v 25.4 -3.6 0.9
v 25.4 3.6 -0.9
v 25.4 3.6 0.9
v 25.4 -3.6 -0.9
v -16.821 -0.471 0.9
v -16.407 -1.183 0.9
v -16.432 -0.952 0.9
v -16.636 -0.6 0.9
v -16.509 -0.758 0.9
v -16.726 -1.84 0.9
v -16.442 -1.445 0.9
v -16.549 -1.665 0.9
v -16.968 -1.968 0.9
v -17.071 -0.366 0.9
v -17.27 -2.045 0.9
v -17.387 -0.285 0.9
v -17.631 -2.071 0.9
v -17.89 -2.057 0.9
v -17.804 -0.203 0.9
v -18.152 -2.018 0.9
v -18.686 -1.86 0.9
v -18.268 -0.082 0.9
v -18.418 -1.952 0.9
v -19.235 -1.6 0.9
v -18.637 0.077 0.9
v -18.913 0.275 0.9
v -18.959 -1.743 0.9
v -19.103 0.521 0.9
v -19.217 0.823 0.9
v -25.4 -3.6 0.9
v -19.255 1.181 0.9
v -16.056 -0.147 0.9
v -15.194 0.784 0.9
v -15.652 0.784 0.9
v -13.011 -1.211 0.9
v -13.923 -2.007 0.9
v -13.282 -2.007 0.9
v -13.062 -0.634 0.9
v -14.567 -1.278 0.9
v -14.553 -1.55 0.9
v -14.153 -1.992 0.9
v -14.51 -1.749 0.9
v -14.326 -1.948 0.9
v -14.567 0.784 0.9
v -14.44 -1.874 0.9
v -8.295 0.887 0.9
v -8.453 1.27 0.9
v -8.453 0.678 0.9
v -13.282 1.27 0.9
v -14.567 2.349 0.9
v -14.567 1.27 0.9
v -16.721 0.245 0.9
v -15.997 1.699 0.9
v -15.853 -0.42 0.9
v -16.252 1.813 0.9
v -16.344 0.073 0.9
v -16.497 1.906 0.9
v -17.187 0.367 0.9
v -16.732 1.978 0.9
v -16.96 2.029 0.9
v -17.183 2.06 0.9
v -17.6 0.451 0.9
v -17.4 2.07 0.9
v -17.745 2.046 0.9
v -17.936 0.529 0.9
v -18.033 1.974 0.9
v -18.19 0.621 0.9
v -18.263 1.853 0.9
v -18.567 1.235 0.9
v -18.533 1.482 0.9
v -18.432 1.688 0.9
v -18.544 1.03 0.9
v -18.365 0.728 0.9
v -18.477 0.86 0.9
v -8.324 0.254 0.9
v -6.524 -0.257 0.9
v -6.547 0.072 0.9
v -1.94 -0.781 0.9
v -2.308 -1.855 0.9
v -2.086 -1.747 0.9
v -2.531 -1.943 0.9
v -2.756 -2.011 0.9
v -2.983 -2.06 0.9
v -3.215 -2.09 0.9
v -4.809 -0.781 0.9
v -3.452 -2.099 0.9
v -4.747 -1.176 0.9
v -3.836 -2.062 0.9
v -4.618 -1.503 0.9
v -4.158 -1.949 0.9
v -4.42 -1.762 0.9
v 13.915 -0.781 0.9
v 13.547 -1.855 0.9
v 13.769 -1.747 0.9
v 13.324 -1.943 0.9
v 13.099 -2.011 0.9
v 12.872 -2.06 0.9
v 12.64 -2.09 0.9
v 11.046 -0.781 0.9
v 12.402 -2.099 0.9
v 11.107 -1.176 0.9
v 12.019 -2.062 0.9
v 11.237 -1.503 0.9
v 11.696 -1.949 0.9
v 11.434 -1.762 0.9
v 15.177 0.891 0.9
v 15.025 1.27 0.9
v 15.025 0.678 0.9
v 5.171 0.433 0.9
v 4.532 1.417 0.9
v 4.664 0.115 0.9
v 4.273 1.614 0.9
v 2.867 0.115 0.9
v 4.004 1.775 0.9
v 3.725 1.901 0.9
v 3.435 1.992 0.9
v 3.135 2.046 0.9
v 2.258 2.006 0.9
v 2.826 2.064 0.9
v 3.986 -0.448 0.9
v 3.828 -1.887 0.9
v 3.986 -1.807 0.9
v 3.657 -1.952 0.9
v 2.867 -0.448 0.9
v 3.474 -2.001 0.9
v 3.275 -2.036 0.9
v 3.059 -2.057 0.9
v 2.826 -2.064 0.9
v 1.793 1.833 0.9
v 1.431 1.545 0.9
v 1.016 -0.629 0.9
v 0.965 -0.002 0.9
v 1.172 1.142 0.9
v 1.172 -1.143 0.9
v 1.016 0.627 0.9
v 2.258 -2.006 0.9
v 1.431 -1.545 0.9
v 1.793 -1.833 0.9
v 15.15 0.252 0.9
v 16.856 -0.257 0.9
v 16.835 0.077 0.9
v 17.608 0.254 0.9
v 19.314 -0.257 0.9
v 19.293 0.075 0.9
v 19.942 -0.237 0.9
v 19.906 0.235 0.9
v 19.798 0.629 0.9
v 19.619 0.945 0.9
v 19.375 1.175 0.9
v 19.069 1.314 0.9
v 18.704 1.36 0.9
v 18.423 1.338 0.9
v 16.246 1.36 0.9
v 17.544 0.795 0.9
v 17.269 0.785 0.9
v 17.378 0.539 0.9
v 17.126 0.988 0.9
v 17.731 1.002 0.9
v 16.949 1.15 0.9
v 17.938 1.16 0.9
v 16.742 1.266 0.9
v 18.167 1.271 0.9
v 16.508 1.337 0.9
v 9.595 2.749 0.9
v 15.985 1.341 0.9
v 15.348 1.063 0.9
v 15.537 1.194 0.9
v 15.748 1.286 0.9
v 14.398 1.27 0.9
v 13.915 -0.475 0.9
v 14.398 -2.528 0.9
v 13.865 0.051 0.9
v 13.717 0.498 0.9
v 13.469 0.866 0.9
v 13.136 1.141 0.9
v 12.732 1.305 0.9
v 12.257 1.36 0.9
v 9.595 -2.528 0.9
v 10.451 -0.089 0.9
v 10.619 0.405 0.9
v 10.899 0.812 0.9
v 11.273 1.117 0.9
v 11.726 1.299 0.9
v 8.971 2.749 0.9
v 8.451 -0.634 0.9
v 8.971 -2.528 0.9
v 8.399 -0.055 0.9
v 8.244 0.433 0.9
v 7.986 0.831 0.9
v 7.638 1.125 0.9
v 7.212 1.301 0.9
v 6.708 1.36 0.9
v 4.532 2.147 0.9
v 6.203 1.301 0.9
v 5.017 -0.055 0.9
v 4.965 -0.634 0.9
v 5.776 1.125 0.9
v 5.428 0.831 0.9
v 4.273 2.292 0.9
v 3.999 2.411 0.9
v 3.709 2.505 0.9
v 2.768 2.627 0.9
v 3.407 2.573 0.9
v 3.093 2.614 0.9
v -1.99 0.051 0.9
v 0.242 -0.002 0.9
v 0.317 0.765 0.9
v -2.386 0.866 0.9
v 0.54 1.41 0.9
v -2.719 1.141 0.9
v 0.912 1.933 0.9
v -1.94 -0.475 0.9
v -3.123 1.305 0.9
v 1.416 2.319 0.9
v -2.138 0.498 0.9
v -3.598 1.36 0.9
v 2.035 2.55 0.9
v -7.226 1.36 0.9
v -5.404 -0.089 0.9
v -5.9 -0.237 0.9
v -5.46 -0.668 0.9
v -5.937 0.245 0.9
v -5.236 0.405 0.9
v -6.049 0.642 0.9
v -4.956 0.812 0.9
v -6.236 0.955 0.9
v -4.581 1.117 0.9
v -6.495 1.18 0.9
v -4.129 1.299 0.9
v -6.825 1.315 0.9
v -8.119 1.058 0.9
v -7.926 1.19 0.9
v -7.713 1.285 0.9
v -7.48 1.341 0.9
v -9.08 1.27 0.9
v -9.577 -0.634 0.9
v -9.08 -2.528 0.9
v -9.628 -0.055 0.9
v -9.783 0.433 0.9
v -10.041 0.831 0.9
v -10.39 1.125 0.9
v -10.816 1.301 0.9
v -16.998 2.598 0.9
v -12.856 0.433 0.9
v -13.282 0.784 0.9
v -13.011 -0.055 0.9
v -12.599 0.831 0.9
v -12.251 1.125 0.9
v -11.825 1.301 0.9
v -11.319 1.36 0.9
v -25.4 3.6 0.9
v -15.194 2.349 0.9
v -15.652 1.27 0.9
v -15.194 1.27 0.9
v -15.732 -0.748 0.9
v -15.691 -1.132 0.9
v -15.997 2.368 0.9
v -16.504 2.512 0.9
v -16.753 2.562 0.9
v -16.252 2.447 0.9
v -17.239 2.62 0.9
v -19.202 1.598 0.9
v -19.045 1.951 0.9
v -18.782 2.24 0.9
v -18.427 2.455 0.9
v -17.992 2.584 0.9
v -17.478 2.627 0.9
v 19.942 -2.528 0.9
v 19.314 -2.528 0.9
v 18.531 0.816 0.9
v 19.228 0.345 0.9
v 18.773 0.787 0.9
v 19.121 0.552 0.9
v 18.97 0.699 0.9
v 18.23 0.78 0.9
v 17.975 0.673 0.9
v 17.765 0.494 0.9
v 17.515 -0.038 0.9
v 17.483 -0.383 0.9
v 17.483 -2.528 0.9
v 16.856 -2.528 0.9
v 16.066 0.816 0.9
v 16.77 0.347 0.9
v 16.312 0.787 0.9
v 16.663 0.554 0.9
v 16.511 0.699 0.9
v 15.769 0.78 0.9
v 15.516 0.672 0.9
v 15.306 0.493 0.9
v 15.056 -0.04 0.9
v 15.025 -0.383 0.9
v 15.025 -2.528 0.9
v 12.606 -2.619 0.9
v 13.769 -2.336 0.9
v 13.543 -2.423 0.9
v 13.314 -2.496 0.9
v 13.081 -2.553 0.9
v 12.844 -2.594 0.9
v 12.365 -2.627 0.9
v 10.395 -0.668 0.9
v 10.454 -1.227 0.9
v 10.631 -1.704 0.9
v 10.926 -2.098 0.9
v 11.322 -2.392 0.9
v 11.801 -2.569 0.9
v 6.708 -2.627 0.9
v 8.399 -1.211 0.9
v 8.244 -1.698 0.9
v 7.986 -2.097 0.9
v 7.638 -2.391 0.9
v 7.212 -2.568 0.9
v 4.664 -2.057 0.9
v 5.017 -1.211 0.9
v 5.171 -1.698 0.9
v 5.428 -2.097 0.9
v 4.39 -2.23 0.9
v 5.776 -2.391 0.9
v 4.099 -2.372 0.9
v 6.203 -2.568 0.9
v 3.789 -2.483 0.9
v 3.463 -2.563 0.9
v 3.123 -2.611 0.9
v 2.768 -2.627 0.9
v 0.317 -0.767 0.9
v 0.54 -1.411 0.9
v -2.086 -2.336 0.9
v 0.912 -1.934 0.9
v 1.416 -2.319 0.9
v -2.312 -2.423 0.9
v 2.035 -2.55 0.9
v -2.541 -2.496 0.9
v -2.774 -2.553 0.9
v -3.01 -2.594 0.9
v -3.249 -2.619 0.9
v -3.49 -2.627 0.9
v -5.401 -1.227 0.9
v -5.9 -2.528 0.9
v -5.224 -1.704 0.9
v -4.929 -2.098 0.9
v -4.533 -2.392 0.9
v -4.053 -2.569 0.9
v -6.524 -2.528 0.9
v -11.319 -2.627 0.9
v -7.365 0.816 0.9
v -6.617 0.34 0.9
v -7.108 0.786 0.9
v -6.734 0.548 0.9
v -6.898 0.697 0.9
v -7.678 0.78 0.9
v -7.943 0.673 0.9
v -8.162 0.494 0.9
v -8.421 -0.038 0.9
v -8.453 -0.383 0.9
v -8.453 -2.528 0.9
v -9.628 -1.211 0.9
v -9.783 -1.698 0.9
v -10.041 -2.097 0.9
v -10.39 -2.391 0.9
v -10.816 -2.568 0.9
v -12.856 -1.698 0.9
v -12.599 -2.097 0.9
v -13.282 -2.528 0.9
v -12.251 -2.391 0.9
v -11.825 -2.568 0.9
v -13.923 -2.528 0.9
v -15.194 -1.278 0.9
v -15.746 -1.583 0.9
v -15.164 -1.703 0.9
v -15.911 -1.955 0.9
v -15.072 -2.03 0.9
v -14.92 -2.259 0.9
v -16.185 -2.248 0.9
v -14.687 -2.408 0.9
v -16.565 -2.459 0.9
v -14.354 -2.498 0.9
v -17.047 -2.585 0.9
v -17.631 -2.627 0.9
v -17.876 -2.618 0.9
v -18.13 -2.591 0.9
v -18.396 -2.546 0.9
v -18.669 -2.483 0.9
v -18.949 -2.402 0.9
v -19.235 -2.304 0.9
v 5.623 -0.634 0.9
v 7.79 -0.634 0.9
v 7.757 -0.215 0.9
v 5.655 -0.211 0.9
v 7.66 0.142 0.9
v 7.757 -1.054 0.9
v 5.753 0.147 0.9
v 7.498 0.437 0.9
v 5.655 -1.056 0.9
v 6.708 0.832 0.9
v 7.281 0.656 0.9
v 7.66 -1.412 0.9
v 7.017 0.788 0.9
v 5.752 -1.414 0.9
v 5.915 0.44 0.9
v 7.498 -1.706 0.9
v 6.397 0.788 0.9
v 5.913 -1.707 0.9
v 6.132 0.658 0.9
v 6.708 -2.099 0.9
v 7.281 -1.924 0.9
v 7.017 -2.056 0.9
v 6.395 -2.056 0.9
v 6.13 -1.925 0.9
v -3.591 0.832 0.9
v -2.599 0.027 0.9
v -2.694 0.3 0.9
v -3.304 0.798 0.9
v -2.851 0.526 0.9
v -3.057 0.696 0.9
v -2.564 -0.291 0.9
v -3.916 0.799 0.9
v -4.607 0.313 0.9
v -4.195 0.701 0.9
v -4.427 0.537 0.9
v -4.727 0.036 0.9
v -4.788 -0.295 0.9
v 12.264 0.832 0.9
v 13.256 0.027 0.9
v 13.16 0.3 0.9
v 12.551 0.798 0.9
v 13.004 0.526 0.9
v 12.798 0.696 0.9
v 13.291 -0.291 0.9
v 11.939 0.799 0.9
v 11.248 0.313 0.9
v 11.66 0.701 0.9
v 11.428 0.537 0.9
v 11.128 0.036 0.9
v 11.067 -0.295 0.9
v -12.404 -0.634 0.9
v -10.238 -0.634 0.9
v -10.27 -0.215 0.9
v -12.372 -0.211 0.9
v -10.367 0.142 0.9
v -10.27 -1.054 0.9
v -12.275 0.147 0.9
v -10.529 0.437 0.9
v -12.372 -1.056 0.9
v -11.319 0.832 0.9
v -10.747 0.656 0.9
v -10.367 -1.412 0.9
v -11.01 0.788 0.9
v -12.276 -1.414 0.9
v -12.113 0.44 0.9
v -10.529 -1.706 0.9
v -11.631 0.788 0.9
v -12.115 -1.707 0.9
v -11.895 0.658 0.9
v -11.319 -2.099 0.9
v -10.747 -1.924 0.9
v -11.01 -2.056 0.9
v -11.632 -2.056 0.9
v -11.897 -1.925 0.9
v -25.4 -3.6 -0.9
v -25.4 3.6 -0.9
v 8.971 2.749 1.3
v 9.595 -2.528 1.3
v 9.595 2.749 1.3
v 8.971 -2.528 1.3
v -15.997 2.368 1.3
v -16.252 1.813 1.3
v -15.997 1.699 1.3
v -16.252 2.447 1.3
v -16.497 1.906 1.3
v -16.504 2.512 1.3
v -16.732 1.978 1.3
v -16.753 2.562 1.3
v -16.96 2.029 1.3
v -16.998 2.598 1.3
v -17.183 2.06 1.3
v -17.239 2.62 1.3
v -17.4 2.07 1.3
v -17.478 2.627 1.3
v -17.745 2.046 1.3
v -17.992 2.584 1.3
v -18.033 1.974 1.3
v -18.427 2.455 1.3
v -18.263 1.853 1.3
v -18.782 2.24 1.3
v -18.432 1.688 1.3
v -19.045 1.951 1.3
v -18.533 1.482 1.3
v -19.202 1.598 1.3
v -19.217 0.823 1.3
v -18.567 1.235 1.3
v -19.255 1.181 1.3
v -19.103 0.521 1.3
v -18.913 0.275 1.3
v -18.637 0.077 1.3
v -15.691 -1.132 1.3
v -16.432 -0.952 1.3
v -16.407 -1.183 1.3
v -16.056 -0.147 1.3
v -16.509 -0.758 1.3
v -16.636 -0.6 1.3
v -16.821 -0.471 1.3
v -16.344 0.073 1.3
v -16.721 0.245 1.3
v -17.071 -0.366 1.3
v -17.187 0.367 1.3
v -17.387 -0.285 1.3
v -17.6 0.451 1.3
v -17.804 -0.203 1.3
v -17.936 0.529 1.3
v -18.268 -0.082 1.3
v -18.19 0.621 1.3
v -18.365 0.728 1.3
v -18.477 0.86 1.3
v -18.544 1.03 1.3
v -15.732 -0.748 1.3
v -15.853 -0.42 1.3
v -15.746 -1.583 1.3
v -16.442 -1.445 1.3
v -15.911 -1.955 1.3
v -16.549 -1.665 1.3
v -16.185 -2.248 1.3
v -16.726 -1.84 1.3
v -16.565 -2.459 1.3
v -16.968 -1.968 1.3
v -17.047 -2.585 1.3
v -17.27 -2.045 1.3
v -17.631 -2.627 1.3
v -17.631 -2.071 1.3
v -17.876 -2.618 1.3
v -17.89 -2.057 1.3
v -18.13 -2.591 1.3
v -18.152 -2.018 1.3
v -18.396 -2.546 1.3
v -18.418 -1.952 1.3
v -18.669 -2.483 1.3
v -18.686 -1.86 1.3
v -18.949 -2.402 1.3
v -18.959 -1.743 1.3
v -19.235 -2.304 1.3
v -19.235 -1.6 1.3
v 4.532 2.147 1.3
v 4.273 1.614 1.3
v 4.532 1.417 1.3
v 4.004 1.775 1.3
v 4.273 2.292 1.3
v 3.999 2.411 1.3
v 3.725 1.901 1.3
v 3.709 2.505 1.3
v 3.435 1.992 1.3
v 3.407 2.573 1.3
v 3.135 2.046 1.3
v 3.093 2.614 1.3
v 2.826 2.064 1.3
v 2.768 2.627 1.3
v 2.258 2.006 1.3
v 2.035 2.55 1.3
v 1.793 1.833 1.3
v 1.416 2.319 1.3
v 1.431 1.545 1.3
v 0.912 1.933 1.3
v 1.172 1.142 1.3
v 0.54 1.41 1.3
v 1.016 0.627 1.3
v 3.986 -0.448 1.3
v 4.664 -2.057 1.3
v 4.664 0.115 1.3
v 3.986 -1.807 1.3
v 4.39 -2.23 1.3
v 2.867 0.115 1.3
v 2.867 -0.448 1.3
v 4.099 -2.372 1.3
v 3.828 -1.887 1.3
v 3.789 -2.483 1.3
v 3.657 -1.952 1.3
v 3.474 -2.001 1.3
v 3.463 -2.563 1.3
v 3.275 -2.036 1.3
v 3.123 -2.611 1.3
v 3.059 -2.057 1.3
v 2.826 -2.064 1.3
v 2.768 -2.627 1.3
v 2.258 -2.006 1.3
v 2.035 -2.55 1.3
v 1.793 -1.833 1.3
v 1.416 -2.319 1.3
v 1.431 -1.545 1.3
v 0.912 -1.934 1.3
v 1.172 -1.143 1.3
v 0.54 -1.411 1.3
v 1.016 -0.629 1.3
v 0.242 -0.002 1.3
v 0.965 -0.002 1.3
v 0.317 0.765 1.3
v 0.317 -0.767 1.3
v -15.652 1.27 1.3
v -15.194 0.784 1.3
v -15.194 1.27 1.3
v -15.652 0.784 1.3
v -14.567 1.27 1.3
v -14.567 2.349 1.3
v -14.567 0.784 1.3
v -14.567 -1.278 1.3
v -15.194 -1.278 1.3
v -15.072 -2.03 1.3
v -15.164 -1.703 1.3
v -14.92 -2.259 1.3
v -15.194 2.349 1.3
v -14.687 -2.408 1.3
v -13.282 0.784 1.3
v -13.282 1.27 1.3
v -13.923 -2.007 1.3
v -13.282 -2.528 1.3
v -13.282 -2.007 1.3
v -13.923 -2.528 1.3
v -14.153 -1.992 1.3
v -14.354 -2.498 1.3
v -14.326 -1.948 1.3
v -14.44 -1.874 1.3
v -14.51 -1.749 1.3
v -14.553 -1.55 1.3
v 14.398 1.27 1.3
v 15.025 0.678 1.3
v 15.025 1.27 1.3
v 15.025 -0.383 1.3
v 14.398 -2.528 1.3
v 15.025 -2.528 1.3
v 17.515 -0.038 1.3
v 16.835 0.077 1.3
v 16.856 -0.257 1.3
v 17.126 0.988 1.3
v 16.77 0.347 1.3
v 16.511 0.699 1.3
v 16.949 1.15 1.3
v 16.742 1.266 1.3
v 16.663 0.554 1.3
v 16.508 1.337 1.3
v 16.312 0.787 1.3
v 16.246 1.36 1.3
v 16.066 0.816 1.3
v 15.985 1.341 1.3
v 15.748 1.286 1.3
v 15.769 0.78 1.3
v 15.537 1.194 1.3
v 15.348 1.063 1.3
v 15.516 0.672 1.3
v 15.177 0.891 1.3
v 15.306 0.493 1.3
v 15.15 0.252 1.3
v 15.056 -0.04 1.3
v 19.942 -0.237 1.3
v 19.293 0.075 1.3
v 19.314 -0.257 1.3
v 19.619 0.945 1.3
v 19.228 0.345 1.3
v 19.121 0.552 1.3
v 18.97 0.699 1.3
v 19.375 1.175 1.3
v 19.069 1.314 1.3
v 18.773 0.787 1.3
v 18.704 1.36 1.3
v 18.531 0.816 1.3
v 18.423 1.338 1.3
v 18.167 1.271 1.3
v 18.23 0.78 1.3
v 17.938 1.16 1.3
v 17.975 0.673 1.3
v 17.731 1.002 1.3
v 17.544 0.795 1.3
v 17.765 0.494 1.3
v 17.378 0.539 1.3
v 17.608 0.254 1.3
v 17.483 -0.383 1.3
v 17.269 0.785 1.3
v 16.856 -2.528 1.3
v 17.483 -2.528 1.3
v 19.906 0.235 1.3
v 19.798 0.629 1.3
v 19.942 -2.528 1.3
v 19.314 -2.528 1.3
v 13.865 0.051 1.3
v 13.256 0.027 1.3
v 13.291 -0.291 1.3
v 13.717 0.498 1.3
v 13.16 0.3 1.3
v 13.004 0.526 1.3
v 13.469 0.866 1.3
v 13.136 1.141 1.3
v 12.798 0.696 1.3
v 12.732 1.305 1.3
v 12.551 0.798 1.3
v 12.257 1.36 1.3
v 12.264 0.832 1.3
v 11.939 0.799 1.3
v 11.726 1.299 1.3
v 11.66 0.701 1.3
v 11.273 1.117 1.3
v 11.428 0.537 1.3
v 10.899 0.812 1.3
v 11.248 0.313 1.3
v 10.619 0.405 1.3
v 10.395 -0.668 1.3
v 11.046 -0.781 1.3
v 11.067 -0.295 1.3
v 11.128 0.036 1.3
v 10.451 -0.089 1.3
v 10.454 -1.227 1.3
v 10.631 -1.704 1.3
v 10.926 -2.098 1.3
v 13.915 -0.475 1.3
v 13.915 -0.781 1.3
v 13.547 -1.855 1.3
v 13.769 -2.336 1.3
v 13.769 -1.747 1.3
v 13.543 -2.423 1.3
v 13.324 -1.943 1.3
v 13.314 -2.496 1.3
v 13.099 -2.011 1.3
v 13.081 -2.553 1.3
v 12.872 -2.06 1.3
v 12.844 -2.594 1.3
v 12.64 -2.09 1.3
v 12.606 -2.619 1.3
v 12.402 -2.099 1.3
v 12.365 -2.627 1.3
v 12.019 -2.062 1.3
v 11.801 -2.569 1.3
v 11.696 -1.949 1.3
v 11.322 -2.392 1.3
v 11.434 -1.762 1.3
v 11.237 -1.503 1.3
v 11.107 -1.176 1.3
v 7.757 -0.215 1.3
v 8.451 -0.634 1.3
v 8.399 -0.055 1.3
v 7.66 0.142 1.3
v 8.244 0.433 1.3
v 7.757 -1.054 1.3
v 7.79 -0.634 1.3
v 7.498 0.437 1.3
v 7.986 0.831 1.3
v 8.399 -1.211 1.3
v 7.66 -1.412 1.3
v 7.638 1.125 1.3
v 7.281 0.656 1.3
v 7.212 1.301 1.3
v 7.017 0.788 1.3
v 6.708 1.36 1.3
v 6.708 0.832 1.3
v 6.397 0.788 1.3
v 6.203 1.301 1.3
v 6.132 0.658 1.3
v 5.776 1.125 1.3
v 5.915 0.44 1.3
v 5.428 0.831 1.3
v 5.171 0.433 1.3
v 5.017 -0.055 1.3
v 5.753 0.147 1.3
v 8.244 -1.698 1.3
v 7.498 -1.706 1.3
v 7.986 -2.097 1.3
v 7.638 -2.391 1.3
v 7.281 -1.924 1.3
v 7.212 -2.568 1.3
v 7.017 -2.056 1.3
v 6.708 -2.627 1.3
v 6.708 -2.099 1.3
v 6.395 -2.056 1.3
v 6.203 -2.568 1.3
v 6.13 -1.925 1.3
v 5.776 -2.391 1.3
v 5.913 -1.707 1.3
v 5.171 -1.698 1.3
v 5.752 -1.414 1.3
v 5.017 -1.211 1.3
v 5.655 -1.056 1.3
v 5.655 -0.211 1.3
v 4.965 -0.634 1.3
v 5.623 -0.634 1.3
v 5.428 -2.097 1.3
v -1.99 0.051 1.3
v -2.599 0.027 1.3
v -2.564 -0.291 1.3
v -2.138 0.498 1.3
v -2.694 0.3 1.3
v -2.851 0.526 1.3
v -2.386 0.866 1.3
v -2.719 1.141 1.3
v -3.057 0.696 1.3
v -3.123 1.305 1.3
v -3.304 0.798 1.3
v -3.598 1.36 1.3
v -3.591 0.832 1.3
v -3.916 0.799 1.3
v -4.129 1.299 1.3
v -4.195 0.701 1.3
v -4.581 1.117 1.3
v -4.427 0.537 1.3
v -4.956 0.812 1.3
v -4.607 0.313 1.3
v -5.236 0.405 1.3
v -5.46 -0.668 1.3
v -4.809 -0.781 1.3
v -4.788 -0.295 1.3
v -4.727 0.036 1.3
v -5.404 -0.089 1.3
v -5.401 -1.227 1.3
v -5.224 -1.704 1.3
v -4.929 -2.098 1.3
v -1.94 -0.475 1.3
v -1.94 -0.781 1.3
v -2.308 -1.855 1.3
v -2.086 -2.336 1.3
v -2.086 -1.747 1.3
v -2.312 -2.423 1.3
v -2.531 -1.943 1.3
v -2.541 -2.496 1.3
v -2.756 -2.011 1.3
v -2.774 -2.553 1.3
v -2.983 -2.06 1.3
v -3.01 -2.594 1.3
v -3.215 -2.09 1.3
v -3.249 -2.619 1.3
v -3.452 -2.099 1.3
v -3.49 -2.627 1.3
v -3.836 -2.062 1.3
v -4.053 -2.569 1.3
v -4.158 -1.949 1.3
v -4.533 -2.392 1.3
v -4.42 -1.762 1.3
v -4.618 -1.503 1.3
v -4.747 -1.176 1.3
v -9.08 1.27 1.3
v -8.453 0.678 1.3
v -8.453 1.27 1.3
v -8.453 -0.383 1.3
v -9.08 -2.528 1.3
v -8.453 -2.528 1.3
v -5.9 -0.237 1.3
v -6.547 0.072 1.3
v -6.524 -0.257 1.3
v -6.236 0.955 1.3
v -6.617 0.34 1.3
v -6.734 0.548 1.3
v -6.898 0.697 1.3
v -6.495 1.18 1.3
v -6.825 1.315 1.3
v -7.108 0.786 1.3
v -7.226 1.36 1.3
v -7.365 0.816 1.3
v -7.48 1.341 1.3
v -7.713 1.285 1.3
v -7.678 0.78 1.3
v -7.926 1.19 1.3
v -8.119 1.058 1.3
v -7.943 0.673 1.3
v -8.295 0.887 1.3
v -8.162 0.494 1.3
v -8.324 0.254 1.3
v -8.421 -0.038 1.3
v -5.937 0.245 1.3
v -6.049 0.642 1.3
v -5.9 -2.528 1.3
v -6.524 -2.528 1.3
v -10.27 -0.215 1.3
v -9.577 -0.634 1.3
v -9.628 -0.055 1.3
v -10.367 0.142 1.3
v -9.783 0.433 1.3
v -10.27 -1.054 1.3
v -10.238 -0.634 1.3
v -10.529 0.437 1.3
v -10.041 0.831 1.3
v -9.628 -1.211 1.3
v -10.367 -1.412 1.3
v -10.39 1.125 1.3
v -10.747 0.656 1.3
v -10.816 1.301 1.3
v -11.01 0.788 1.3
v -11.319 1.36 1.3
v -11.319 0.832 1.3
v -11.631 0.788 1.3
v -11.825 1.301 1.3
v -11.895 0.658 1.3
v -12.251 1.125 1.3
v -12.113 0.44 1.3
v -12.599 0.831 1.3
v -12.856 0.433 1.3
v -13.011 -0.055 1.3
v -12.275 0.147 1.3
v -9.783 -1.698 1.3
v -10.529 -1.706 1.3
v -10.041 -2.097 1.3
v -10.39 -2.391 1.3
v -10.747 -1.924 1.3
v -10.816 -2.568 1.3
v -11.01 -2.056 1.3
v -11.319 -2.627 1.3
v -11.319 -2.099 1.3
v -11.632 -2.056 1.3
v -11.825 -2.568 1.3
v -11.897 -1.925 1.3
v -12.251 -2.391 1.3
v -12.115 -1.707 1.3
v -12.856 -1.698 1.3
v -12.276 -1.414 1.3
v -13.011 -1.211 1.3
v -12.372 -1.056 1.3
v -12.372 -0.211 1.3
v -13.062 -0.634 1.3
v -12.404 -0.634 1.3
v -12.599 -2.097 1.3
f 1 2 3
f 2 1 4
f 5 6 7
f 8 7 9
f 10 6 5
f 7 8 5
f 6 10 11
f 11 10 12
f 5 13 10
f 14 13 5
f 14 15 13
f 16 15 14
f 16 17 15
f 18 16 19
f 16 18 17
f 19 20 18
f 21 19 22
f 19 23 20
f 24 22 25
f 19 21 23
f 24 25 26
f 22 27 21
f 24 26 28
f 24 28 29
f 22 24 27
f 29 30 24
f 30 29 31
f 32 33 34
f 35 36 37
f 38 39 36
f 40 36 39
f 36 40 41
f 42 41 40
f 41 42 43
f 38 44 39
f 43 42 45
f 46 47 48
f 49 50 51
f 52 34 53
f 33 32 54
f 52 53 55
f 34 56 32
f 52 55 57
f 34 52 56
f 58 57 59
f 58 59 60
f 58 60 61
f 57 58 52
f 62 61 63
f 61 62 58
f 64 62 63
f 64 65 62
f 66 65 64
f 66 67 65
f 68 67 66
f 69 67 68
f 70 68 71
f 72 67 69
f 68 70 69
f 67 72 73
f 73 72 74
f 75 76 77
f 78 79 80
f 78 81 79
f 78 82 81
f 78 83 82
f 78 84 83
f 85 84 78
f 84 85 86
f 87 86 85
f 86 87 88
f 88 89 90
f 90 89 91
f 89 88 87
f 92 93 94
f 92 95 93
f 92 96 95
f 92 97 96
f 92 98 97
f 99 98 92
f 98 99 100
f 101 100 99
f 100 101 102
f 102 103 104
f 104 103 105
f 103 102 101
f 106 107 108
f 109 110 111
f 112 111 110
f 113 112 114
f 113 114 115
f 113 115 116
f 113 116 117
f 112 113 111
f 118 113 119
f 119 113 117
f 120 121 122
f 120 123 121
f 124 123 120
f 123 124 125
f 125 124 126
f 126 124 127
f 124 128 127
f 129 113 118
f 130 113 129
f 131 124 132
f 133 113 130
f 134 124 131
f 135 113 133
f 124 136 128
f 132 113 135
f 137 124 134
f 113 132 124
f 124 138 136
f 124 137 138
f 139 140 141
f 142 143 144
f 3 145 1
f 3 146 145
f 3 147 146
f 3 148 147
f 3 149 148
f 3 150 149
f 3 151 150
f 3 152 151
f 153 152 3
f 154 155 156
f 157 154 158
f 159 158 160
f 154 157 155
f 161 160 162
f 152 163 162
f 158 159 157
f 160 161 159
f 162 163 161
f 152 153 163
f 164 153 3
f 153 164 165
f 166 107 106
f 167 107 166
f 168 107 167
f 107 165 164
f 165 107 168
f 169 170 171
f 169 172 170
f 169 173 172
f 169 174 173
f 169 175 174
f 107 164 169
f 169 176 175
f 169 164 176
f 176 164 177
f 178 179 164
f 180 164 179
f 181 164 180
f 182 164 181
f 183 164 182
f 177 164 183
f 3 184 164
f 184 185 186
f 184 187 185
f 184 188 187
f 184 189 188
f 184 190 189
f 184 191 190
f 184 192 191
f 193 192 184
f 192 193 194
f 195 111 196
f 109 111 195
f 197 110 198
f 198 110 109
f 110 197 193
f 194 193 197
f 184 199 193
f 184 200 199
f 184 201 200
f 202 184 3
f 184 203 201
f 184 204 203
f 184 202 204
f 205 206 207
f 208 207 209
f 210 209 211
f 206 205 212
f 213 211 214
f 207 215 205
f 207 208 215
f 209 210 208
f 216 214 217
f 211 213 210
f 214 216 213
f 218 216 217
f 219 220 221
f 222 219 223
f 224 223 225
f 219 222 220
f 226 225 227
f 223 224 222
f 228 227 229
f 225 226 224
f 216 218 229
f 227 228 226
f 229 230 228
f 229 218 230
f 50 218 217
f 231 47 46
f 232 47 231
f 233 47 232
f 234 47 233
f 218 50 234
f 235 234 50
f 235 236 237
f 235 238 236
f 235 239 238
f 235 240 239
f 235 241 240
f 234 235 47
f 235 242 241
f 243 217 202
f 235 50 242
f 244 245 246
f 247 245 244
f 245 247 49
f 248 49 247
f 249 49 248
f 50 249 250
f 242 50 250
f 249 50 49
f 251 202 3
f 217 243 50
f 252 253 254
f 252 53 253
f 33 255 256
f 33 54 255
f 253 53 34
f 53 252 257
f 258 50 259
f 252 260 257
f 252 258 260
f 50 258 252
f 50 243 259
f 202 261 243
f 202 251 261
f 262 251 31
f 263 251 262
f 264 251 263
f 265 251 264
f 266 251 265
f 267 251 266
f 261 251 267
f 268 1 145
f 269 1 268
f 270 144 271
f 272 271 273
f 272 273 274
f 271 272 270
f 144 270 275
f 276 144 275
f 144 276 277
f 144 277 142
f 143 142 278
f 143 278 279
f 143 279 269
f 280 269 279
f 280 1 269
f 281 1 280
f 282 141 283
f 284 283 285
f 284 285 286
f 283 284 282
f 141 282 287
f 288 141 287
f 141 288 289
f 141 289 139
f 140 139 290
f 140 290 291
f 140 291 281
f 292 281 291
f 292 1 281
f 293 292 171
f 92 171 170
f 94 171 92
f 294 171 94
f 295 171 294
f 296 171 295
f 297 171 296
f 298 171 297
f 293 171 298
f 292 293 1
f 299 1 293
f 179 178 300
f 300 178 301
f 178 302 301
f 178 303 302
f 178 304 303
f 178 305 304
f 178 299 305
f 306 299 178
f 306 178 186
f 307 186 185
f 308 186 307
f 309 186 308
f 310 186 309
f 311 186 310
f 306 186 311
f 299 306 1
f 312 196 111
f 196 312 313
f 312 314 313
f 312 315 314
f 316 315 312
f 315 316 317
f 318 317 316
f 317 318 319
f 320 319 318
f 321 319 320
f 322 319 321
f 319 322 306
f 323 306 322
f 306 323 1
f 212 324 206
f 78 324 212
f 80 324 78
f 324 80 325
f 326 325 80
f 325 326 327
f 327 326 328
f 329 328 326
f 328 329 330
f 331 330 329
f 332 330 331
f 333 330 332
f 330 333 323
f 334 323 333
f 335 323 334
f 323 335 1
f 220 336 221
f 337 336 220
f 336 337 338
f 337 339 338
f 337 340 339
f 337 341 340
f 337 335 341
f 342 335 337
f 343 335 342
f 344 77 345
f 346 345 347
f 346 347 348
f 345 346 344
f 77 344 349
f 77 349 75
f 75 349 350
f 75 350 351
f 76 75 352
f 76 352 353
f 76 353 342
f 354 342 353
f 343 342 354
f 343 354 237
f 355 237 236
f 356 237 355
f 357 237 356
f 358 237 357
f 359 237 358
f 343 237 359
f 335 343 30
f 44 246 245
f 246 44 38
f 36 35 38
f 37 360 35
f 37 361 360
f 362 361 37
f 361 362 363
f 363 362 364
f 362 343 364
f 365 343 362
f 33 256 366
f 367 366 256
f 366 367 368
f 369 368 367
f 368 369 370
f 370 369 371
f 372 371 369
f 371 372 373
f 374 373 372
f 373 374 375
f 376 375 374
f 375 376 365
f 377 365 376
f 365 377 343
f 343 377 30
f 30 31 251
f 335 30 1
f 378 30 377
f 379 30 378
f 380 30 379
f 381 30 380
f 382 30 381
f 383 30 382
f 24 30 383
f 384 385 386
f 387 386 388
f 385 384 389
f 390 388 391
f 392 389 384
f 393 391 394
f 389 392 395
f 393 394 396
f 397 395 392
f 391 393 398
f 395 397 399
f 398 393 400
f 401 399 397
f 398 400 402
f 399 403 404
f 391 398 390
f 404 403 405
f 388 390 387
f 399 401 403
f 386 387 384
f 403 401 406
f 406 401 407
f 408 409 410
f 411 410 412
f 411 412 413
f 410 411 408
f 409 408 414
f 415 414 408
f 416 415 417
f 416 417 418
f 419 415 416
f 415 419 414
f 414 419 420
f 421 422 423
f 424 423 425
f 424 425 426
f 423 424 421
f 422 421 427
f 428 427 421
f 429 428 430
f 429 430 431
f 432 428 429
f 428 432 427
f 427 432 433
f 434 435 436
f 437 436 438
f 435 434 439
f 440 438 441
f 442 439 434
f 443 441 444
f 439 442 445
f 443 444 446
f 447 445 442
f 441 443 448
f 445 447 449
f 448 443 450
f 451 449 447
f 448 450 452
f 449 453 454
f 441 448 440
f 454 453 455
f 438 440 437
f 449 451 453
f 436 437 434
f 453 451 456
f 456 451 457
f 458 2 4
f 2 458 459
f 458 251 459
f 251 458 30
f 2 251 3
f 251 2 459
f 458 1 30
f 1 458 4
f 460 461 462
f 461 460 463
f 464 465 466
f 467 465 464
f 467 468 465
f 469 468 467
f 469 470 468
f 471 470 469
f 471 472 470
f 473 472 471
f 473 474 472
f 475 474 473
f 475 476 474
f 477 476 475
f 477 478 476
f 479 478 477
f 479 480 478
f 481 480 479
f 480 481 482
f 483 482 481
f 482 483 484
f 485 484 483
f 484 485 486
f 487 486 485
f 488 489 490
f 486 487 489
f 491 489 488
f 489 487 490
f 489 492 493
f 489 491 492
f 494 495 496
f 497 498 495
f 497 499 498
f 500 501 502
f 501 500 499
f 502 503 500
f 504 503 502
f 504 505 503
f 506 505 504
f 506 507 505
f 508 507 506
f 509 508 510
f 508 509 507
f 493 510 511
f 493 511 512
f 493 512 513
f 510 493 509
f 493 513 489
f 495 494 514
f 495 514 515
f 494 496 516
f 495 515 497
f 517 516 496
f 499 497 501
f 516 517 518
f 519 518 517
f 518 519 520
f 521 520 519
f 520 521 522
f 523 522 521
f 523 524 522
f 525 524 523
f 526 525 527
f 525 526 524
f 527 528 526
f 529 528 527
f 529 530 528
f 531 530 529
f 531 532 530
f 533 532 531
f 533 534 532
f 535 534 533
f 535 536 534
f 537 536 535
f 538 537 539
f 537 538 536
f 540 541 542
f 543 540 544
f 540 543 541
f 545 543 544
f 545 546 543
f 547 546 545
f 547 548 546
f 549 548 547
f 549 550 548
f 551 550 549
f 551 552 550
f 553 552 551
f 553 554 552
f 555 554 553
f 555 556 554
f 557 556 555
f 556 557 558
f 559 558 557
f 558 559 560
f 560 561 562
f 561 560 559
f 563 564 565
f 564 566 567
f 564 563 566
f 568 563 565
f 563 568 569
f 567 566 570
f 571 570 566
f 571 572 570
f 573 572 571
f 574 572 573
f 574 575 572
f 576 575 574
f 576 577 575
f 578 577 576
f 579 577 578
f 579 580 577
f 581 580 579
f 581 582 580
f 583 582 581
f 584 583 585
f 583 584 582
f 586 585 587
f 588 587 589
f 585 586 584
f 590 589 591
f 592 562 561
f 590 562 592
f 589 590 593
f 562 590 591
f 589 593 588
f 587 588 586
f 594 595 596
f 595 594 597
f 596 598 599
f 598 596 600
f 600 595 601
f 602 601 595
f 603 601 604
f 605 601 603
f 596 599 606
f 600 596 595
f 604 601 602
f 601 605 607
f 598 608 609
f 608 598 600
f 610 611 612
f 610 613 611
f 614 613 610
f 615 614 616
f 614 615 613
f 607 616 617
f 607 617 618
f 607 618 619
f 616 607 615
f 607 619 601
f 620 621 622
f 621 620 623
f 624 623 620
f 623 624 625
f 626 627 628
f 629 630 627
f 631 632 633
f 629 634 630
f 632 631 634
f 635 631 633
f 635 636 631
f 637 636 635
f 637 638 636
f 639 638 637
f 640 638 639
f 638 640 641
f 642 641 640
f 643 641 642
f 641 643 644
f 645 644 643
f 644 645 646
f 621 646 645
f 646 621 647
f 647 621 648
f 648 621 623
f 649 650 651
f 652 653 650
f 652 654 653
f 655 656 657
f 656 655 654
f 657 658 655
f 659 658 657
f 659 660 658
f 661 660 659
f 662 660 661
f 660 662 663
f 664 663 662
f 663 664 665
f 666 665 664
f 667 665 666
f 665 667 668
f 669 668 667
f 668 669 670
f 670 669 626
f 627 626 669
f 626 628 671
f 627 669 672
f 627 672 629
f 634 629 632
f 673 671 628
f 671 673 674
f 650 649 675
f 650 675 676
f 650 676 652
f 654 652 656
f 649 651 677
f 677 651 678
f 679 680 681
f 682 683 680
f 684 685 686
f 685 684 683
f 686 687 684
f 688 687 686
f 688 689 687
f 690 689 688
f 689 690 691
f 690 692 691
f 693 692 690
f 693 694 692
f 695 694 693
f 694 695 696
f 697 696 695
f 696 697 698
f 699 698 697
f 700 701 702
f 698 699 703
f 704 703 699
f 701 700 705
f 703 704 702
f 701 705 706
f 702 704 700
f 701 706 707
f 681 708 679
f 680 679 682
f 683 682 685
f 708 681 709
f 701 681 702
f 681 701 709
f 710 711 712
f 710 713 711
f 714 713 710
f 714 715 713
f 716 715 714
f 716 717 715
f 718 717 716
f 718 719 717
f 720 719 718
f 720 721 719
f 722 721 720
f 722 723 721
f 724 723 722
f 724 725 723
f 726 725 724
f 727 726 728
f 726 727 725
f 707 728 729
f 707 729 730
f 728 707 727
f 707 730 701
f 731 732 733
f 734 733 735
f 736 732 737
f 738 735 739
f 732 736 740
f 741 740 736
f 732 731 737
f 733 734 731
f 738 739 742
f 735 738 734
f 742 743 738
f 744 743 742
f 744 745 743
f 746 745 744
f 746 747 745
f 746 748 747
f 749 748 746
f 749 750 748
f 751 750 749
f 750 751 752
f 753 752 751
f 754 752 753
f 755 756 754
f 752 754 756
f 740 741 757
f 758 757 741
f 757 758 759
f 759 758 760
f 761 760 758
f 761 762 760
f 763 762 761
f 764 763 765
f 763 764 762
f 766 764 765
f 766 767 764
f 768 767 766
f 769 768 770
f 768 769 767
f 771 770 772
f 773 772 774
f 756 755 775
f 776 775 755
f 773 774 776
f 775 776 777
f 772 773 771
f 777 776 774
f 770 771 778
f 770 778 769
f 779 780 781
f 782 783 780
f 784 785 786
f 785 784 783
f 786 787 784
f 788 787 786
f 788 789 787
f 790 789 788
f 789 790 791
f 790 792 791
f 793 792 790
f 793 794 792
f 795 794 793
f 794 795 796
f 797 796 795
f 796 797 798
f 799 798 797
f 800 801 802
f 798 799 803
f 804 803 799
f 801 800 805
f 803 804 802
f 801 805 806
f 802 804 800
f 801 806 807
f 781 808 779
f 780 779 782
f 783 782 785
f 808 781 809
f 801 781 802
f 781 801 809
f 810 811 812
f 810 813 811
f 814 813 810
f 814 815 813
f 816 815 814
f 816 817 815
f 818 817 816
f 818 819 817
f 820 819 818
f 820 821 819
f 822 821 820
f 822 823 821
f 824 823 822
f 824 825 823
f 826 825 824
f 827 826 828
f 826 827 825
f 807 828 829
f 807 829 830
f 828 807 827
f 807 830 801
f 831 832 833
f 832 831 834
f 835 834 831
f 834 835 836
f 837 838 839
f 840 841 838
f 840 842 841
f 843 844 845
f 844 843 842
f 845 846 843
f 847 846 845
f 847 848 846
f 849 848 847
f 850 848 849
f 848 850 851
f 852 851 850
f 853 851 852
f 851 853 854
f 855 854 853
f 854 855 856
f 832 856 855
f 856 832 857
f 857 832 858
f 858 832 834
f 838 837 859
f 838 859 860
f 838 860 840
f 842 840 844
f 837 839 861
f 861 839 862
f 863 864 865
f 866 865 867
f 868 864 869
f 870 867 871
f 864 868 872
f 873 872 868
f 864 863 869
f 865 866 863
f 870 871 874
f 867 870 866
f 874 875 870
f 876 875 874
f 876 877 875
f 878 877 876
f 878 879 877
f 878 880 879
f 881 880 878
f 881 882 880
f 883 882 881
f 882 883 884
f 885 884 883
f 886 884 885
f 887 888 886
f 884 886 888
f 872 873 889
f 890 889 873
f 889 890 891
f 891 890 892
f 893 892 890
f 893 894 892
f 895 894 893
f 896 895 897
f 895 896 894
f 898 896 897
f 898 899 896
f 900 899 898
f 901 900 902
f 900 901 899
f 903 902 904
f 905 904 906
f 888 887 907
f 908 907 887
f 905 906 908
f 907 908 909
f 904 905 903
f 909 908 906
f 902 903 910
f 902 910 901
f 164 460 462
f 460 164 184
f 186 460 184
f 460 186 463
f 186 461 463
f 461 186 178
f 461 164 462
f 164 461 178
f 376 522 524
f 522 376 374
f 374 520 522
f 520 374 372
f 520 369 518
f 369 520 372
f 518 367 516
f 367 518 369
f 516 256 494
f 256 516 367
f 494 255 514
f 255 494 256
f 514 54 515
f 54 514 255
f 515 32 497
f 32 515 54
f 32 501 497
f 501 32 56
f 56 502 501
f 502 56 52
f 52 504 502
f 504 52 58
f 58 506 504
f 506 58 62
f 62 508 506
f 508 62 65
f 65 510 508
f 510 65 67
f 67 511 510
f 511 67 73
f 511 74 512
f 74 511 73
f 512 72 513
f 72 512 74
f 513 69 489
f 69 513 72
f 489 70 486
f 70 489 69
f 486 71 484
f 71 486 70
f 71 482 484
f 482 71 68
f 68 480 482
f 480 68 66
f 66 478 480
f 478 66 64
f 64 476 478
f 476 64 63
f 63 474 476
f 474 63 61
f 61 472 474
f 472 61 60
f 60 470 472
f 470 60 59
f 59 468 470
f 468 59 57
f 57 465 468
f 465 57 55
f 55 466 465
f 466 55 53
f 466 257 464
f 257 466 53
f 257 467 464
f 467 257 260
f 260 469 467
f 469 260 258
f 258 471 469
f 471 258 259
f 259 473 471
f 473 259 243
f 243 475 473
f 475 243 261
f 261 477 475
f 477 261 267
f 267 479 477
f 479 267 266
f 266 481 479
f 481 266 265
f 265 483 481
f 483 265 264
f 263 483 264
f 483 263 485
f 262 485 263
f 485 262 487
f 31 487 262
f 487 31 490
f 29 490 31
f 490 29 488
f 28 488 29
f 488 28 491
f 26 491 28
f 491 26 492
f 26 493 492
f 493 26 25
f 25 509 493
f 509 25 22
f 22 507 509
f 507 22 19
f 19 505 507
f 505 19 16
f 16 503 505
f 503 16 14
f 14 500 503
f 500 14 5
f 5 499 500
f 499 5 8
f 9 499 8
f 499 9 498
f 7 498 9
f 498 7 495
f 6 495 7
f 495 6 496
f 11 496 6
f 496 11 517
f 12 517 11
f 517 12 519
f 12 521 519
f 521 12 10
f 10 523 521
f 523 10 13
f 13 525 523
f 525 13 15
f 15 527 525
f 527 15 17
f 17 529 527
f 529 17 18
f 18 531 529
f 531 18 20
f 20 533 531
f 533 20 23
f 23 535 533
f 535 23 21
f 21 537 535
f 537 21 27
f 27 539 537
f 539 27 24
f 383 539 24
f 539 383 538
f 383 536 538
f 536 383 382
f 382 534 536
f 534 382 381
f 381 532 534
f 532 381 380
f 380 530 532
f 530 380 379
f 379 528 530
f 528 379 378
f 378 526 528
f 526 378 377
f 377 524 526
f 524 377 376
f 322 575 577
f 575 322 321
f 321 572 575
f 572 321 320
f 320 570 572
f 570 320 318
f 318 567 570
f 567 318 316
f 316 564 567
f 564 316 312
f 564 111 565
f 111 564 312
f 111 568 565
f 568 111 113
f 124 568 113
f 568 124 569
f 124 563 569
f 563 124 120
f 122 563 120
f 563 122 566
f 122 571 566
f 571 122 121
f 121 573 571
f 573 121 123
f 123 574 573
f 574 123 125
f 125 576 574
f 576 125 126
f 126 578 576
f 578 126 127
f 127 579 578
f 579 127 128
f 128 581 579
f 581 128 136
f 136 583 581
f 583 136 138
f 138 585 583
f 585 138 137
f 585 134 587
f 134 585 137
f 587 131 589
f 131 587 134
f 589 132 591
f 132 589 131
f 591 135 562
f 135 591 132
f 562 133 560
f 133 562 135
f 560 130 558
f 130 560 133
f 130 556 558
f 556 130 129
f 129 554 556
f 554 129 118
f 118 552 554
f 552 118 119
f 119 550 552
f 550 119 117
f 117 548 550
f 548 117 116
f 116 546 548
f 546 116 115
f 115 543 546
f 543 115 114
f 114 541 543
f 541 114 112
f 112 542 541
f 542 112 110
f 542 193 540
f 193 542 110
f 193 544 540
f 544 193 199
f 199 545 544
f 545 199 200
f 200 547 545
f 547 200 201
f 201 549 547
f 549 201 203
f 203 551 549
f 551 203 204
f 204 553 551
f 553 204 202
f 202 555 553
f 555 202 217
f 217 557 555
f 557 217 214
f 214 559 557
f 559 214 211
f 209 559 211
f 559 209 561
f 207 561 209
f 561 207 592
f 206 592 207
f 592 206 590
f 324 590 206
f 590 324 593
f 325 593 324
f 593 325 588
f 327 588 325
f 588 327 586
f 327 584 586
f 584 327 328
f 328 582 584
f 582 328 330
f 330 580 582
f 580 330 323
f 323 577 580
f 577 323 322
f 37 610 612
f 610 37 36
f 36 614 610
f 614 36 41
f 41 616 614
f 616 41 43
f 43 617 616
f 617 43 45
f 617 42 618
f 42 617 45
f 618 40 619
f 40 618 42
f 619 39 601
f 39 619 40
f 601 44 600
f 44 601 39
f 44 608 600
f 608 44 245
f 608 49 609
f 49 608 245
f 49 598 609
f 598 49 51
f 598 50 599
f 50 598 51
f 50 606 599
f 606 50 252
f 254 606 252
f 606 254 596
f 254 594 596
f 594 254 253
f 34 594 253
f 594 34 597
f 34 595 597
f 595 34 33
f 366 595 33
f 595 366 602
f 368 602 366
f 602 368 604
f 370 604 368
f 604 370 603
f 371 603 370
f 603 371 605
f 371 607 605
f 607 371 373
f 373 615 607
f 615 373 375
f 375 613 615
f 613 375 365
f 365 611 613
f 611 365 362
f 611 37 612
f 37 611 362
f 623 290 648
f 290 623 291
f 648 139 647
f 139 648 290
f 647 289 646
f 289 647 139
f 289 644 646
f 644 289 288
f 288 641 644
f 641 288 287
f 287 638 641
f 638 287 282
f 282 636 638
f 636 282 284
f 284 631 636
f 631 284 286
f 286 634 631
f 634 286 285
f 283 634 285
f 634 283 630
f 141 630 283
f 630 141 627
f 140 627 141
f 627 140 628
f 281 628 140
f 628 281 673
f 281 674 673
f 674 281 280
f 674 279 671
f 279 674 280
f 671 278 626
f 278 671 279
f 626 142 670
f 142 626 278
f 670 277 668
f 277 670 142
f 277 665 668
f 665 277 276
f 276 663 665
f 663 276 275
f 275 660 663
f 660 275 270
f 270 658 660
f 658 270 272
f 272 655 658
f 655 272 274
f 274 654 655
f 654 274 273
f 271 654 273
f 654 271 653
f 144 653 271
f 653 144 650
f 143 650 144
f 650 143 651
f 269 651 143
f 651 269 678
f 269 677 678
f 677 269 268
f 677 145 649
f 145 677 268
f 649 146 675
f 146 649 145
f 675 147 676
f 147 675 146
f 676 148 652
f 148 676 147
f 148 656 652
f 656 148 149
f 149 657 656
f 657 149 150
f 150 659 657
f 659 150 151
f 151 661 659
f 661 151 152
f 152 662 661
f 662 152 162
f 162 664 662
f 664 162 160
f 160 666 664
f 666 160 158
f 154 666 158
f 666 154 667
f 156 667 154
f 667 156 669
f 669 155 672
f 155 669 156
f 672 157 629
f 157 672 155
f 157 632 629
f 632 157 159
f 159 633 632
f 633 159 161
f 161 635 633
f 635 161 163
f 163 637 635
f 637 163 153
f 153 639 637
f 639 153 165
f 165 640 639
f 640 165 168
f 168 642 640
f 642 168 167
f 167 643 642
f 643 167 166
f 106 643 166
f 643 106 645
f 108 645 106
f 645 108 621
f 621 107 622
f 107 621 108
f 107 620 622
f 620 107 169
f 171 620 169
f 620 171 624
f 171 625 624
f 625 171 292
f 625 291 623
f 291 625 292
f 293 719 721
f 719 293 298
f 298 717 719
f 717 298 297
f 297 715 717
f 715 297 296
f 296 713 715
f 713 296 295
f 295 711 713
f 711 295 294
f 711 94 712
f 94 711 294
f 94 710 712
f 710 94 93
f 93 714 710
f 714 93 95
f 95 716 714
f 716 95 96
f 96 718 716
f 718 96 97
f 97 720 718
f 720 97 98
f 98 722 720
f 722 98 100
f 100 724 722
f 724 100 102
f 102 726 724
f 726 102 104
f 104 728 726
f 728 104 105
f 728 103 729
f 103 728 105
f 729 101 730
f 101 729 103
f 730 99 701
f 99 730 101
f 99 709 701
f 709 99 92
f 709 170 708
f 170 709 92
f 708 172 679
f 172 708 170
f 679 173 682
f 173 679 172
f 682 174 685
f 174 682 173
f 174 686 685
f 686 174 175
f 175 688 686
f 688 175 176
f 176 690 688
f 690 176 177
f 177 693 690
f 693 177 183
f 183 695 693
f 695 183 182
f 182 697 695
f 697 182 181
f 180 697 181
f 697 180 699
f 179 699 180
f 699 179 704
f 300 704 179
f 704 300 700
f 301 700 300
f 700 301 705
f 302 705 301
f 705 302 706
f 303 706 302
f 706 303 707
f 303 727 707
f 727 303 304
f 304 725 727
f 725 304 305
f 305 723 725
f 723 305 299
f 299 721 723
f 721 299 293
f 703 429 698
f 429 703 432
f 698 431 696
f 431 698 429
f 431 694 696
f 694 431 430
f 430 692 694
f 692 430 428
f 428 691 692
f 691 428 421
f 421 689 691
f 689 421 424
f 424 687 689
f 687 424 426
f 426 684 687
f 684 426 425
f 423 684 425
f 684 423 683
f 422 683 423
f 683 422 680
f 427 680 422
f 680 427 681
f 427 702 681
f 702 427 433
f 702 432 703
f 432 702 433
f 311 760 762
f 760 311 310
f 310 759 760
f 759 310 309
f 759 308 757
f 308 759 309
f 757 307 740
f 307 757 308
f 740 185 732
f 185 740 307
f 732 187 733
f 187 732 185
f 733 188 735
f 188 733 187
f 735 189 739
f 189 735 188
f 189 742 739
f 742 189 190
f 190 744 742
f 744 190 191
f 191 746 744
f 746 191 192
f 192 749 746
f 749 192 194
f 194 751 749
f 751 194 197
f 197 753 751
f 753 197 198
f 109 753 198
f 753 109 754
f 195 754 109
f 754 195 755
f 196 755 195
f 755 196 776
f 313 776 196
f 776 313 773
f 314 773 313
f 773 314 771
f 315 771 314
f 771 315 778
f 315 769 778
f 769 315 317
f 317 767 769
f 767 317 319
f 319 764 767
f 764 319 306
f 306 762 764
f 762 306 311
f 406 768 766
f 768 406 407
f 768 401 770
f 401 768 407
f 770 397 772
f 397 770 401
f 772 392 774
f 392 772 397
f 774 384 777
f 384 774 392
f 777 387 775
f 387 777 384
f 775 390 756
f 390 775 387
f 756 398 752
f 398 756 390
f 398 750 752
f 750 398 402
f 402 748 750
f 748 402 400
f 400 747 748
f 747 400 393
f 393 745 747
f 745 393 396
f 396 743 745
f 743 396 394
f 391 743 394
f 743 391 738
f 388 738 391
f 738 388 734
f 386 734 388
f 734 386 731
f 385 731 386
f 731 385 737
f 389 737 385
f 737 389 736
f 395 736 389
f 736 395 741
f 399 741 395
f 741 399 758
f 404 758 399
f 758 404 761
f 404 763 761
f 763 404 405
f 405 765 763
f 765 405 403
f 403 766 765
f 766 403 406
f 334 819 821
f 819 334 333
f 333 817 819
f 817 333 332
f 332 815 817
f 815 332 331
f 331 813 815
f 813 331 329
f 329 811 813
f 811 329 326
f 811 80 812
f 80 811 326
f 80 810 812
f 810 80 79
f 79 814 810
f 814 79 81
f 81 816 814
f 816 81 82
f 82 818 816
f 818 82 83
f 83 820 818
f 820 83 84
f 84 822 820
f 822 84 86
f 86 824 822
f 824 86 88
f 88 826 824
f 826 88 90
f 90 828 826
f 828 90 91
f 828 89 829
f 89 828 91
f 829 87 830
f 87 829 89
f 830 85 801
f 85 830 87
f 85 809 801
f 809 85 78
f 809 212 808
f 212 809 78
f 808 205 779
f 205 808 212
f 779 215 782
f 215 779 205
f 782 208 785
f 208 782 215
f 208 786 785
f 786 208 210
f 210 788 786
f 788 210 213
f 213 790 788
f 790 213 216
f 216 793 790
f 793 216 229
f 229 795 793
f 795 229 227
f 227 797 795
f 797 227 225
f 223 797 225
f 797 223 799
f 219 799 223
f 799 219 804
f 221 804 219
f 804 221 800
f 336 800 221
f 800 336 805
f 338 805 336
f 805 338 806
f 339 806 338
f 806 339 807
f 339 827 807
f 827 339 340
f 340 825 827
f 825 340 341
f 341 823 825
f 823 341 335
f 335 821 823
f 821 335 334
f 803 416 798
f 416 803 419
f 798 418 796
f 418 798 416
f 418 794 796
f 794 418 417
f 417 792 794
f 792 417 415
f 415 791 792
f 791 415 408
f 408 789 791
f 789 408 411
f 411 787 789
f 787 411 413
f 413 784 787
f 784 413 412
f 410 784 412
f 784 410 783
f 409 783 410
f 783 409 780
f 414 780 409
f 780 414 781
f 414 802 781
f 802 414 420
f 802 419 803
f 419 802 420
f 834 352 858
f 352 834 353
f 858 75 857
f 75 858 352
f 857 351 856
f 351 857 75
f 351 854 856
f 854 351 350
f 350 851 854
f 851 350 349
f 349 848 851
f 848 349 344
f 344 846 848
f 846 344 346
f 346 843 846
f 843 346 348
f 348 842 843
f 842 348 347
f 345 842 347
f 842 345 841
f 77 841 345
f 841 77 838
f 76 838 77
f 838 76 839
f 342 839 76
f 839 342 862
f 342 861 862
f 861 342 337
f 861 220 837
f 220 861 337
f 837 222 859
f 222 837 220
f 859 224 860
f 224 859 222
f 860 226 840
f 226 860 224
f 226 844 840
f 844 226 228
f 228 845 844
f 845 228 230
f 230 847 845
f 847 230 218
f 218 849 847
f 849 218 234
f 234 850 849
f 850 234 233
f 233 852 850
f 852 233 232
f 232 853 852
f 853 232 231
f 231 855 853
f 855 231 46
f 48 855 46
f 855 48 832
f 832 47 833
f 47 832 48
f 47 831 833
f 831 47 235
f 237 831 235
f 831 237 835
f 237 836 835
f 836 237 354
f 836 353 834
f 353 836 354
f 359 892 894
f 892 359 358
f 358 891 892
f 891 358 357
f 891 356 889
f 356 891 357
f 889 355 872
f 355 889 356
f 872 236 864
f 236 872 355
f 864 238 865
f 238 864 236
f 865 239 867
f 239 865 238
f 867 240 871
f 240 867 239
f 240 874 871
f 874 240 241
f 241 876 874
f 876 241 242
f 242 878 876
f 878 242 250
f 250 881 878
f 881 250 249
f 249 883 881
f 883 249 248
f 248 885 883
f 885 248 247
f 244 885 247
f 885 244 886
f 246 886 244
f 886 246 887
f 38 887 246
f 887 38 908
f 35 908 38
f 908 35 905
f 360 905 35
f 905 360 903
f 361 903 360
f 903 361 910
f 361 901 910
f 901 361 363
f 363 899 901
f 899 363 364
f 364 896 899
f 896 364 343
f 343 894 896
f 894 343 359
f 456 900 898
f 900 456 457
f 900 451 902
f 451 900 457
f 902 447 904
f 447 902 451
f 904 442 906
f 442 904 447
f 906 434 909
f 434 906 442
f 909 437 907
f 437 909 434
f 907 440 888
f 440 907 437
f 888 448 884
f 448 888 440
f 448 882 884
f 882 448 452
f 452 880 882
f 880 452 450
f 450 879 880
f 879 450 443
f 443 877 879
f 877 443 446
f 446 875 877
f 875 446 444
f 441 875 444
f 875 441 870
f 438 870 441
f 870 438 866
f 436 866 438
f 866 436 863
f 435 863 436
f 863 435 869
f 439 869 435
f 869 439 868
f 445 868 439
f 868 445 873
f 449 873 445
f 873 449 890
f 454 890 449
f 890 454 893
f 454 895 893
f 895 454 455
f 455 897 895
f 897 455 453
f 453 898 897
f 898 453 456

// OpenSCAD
monster_name = "Stone Golem";

cube(size=[50.8, 7.2, 1.8], center=true);
color("BLACK")
    translate([0, 0, 1.8 / 2])
        linear_extrude(height=0.4)
            text(
                monster_name,
                size=5,
                spacing=0.9,
                font="pirataone",
                halign="center",
                valign="center"
            );
